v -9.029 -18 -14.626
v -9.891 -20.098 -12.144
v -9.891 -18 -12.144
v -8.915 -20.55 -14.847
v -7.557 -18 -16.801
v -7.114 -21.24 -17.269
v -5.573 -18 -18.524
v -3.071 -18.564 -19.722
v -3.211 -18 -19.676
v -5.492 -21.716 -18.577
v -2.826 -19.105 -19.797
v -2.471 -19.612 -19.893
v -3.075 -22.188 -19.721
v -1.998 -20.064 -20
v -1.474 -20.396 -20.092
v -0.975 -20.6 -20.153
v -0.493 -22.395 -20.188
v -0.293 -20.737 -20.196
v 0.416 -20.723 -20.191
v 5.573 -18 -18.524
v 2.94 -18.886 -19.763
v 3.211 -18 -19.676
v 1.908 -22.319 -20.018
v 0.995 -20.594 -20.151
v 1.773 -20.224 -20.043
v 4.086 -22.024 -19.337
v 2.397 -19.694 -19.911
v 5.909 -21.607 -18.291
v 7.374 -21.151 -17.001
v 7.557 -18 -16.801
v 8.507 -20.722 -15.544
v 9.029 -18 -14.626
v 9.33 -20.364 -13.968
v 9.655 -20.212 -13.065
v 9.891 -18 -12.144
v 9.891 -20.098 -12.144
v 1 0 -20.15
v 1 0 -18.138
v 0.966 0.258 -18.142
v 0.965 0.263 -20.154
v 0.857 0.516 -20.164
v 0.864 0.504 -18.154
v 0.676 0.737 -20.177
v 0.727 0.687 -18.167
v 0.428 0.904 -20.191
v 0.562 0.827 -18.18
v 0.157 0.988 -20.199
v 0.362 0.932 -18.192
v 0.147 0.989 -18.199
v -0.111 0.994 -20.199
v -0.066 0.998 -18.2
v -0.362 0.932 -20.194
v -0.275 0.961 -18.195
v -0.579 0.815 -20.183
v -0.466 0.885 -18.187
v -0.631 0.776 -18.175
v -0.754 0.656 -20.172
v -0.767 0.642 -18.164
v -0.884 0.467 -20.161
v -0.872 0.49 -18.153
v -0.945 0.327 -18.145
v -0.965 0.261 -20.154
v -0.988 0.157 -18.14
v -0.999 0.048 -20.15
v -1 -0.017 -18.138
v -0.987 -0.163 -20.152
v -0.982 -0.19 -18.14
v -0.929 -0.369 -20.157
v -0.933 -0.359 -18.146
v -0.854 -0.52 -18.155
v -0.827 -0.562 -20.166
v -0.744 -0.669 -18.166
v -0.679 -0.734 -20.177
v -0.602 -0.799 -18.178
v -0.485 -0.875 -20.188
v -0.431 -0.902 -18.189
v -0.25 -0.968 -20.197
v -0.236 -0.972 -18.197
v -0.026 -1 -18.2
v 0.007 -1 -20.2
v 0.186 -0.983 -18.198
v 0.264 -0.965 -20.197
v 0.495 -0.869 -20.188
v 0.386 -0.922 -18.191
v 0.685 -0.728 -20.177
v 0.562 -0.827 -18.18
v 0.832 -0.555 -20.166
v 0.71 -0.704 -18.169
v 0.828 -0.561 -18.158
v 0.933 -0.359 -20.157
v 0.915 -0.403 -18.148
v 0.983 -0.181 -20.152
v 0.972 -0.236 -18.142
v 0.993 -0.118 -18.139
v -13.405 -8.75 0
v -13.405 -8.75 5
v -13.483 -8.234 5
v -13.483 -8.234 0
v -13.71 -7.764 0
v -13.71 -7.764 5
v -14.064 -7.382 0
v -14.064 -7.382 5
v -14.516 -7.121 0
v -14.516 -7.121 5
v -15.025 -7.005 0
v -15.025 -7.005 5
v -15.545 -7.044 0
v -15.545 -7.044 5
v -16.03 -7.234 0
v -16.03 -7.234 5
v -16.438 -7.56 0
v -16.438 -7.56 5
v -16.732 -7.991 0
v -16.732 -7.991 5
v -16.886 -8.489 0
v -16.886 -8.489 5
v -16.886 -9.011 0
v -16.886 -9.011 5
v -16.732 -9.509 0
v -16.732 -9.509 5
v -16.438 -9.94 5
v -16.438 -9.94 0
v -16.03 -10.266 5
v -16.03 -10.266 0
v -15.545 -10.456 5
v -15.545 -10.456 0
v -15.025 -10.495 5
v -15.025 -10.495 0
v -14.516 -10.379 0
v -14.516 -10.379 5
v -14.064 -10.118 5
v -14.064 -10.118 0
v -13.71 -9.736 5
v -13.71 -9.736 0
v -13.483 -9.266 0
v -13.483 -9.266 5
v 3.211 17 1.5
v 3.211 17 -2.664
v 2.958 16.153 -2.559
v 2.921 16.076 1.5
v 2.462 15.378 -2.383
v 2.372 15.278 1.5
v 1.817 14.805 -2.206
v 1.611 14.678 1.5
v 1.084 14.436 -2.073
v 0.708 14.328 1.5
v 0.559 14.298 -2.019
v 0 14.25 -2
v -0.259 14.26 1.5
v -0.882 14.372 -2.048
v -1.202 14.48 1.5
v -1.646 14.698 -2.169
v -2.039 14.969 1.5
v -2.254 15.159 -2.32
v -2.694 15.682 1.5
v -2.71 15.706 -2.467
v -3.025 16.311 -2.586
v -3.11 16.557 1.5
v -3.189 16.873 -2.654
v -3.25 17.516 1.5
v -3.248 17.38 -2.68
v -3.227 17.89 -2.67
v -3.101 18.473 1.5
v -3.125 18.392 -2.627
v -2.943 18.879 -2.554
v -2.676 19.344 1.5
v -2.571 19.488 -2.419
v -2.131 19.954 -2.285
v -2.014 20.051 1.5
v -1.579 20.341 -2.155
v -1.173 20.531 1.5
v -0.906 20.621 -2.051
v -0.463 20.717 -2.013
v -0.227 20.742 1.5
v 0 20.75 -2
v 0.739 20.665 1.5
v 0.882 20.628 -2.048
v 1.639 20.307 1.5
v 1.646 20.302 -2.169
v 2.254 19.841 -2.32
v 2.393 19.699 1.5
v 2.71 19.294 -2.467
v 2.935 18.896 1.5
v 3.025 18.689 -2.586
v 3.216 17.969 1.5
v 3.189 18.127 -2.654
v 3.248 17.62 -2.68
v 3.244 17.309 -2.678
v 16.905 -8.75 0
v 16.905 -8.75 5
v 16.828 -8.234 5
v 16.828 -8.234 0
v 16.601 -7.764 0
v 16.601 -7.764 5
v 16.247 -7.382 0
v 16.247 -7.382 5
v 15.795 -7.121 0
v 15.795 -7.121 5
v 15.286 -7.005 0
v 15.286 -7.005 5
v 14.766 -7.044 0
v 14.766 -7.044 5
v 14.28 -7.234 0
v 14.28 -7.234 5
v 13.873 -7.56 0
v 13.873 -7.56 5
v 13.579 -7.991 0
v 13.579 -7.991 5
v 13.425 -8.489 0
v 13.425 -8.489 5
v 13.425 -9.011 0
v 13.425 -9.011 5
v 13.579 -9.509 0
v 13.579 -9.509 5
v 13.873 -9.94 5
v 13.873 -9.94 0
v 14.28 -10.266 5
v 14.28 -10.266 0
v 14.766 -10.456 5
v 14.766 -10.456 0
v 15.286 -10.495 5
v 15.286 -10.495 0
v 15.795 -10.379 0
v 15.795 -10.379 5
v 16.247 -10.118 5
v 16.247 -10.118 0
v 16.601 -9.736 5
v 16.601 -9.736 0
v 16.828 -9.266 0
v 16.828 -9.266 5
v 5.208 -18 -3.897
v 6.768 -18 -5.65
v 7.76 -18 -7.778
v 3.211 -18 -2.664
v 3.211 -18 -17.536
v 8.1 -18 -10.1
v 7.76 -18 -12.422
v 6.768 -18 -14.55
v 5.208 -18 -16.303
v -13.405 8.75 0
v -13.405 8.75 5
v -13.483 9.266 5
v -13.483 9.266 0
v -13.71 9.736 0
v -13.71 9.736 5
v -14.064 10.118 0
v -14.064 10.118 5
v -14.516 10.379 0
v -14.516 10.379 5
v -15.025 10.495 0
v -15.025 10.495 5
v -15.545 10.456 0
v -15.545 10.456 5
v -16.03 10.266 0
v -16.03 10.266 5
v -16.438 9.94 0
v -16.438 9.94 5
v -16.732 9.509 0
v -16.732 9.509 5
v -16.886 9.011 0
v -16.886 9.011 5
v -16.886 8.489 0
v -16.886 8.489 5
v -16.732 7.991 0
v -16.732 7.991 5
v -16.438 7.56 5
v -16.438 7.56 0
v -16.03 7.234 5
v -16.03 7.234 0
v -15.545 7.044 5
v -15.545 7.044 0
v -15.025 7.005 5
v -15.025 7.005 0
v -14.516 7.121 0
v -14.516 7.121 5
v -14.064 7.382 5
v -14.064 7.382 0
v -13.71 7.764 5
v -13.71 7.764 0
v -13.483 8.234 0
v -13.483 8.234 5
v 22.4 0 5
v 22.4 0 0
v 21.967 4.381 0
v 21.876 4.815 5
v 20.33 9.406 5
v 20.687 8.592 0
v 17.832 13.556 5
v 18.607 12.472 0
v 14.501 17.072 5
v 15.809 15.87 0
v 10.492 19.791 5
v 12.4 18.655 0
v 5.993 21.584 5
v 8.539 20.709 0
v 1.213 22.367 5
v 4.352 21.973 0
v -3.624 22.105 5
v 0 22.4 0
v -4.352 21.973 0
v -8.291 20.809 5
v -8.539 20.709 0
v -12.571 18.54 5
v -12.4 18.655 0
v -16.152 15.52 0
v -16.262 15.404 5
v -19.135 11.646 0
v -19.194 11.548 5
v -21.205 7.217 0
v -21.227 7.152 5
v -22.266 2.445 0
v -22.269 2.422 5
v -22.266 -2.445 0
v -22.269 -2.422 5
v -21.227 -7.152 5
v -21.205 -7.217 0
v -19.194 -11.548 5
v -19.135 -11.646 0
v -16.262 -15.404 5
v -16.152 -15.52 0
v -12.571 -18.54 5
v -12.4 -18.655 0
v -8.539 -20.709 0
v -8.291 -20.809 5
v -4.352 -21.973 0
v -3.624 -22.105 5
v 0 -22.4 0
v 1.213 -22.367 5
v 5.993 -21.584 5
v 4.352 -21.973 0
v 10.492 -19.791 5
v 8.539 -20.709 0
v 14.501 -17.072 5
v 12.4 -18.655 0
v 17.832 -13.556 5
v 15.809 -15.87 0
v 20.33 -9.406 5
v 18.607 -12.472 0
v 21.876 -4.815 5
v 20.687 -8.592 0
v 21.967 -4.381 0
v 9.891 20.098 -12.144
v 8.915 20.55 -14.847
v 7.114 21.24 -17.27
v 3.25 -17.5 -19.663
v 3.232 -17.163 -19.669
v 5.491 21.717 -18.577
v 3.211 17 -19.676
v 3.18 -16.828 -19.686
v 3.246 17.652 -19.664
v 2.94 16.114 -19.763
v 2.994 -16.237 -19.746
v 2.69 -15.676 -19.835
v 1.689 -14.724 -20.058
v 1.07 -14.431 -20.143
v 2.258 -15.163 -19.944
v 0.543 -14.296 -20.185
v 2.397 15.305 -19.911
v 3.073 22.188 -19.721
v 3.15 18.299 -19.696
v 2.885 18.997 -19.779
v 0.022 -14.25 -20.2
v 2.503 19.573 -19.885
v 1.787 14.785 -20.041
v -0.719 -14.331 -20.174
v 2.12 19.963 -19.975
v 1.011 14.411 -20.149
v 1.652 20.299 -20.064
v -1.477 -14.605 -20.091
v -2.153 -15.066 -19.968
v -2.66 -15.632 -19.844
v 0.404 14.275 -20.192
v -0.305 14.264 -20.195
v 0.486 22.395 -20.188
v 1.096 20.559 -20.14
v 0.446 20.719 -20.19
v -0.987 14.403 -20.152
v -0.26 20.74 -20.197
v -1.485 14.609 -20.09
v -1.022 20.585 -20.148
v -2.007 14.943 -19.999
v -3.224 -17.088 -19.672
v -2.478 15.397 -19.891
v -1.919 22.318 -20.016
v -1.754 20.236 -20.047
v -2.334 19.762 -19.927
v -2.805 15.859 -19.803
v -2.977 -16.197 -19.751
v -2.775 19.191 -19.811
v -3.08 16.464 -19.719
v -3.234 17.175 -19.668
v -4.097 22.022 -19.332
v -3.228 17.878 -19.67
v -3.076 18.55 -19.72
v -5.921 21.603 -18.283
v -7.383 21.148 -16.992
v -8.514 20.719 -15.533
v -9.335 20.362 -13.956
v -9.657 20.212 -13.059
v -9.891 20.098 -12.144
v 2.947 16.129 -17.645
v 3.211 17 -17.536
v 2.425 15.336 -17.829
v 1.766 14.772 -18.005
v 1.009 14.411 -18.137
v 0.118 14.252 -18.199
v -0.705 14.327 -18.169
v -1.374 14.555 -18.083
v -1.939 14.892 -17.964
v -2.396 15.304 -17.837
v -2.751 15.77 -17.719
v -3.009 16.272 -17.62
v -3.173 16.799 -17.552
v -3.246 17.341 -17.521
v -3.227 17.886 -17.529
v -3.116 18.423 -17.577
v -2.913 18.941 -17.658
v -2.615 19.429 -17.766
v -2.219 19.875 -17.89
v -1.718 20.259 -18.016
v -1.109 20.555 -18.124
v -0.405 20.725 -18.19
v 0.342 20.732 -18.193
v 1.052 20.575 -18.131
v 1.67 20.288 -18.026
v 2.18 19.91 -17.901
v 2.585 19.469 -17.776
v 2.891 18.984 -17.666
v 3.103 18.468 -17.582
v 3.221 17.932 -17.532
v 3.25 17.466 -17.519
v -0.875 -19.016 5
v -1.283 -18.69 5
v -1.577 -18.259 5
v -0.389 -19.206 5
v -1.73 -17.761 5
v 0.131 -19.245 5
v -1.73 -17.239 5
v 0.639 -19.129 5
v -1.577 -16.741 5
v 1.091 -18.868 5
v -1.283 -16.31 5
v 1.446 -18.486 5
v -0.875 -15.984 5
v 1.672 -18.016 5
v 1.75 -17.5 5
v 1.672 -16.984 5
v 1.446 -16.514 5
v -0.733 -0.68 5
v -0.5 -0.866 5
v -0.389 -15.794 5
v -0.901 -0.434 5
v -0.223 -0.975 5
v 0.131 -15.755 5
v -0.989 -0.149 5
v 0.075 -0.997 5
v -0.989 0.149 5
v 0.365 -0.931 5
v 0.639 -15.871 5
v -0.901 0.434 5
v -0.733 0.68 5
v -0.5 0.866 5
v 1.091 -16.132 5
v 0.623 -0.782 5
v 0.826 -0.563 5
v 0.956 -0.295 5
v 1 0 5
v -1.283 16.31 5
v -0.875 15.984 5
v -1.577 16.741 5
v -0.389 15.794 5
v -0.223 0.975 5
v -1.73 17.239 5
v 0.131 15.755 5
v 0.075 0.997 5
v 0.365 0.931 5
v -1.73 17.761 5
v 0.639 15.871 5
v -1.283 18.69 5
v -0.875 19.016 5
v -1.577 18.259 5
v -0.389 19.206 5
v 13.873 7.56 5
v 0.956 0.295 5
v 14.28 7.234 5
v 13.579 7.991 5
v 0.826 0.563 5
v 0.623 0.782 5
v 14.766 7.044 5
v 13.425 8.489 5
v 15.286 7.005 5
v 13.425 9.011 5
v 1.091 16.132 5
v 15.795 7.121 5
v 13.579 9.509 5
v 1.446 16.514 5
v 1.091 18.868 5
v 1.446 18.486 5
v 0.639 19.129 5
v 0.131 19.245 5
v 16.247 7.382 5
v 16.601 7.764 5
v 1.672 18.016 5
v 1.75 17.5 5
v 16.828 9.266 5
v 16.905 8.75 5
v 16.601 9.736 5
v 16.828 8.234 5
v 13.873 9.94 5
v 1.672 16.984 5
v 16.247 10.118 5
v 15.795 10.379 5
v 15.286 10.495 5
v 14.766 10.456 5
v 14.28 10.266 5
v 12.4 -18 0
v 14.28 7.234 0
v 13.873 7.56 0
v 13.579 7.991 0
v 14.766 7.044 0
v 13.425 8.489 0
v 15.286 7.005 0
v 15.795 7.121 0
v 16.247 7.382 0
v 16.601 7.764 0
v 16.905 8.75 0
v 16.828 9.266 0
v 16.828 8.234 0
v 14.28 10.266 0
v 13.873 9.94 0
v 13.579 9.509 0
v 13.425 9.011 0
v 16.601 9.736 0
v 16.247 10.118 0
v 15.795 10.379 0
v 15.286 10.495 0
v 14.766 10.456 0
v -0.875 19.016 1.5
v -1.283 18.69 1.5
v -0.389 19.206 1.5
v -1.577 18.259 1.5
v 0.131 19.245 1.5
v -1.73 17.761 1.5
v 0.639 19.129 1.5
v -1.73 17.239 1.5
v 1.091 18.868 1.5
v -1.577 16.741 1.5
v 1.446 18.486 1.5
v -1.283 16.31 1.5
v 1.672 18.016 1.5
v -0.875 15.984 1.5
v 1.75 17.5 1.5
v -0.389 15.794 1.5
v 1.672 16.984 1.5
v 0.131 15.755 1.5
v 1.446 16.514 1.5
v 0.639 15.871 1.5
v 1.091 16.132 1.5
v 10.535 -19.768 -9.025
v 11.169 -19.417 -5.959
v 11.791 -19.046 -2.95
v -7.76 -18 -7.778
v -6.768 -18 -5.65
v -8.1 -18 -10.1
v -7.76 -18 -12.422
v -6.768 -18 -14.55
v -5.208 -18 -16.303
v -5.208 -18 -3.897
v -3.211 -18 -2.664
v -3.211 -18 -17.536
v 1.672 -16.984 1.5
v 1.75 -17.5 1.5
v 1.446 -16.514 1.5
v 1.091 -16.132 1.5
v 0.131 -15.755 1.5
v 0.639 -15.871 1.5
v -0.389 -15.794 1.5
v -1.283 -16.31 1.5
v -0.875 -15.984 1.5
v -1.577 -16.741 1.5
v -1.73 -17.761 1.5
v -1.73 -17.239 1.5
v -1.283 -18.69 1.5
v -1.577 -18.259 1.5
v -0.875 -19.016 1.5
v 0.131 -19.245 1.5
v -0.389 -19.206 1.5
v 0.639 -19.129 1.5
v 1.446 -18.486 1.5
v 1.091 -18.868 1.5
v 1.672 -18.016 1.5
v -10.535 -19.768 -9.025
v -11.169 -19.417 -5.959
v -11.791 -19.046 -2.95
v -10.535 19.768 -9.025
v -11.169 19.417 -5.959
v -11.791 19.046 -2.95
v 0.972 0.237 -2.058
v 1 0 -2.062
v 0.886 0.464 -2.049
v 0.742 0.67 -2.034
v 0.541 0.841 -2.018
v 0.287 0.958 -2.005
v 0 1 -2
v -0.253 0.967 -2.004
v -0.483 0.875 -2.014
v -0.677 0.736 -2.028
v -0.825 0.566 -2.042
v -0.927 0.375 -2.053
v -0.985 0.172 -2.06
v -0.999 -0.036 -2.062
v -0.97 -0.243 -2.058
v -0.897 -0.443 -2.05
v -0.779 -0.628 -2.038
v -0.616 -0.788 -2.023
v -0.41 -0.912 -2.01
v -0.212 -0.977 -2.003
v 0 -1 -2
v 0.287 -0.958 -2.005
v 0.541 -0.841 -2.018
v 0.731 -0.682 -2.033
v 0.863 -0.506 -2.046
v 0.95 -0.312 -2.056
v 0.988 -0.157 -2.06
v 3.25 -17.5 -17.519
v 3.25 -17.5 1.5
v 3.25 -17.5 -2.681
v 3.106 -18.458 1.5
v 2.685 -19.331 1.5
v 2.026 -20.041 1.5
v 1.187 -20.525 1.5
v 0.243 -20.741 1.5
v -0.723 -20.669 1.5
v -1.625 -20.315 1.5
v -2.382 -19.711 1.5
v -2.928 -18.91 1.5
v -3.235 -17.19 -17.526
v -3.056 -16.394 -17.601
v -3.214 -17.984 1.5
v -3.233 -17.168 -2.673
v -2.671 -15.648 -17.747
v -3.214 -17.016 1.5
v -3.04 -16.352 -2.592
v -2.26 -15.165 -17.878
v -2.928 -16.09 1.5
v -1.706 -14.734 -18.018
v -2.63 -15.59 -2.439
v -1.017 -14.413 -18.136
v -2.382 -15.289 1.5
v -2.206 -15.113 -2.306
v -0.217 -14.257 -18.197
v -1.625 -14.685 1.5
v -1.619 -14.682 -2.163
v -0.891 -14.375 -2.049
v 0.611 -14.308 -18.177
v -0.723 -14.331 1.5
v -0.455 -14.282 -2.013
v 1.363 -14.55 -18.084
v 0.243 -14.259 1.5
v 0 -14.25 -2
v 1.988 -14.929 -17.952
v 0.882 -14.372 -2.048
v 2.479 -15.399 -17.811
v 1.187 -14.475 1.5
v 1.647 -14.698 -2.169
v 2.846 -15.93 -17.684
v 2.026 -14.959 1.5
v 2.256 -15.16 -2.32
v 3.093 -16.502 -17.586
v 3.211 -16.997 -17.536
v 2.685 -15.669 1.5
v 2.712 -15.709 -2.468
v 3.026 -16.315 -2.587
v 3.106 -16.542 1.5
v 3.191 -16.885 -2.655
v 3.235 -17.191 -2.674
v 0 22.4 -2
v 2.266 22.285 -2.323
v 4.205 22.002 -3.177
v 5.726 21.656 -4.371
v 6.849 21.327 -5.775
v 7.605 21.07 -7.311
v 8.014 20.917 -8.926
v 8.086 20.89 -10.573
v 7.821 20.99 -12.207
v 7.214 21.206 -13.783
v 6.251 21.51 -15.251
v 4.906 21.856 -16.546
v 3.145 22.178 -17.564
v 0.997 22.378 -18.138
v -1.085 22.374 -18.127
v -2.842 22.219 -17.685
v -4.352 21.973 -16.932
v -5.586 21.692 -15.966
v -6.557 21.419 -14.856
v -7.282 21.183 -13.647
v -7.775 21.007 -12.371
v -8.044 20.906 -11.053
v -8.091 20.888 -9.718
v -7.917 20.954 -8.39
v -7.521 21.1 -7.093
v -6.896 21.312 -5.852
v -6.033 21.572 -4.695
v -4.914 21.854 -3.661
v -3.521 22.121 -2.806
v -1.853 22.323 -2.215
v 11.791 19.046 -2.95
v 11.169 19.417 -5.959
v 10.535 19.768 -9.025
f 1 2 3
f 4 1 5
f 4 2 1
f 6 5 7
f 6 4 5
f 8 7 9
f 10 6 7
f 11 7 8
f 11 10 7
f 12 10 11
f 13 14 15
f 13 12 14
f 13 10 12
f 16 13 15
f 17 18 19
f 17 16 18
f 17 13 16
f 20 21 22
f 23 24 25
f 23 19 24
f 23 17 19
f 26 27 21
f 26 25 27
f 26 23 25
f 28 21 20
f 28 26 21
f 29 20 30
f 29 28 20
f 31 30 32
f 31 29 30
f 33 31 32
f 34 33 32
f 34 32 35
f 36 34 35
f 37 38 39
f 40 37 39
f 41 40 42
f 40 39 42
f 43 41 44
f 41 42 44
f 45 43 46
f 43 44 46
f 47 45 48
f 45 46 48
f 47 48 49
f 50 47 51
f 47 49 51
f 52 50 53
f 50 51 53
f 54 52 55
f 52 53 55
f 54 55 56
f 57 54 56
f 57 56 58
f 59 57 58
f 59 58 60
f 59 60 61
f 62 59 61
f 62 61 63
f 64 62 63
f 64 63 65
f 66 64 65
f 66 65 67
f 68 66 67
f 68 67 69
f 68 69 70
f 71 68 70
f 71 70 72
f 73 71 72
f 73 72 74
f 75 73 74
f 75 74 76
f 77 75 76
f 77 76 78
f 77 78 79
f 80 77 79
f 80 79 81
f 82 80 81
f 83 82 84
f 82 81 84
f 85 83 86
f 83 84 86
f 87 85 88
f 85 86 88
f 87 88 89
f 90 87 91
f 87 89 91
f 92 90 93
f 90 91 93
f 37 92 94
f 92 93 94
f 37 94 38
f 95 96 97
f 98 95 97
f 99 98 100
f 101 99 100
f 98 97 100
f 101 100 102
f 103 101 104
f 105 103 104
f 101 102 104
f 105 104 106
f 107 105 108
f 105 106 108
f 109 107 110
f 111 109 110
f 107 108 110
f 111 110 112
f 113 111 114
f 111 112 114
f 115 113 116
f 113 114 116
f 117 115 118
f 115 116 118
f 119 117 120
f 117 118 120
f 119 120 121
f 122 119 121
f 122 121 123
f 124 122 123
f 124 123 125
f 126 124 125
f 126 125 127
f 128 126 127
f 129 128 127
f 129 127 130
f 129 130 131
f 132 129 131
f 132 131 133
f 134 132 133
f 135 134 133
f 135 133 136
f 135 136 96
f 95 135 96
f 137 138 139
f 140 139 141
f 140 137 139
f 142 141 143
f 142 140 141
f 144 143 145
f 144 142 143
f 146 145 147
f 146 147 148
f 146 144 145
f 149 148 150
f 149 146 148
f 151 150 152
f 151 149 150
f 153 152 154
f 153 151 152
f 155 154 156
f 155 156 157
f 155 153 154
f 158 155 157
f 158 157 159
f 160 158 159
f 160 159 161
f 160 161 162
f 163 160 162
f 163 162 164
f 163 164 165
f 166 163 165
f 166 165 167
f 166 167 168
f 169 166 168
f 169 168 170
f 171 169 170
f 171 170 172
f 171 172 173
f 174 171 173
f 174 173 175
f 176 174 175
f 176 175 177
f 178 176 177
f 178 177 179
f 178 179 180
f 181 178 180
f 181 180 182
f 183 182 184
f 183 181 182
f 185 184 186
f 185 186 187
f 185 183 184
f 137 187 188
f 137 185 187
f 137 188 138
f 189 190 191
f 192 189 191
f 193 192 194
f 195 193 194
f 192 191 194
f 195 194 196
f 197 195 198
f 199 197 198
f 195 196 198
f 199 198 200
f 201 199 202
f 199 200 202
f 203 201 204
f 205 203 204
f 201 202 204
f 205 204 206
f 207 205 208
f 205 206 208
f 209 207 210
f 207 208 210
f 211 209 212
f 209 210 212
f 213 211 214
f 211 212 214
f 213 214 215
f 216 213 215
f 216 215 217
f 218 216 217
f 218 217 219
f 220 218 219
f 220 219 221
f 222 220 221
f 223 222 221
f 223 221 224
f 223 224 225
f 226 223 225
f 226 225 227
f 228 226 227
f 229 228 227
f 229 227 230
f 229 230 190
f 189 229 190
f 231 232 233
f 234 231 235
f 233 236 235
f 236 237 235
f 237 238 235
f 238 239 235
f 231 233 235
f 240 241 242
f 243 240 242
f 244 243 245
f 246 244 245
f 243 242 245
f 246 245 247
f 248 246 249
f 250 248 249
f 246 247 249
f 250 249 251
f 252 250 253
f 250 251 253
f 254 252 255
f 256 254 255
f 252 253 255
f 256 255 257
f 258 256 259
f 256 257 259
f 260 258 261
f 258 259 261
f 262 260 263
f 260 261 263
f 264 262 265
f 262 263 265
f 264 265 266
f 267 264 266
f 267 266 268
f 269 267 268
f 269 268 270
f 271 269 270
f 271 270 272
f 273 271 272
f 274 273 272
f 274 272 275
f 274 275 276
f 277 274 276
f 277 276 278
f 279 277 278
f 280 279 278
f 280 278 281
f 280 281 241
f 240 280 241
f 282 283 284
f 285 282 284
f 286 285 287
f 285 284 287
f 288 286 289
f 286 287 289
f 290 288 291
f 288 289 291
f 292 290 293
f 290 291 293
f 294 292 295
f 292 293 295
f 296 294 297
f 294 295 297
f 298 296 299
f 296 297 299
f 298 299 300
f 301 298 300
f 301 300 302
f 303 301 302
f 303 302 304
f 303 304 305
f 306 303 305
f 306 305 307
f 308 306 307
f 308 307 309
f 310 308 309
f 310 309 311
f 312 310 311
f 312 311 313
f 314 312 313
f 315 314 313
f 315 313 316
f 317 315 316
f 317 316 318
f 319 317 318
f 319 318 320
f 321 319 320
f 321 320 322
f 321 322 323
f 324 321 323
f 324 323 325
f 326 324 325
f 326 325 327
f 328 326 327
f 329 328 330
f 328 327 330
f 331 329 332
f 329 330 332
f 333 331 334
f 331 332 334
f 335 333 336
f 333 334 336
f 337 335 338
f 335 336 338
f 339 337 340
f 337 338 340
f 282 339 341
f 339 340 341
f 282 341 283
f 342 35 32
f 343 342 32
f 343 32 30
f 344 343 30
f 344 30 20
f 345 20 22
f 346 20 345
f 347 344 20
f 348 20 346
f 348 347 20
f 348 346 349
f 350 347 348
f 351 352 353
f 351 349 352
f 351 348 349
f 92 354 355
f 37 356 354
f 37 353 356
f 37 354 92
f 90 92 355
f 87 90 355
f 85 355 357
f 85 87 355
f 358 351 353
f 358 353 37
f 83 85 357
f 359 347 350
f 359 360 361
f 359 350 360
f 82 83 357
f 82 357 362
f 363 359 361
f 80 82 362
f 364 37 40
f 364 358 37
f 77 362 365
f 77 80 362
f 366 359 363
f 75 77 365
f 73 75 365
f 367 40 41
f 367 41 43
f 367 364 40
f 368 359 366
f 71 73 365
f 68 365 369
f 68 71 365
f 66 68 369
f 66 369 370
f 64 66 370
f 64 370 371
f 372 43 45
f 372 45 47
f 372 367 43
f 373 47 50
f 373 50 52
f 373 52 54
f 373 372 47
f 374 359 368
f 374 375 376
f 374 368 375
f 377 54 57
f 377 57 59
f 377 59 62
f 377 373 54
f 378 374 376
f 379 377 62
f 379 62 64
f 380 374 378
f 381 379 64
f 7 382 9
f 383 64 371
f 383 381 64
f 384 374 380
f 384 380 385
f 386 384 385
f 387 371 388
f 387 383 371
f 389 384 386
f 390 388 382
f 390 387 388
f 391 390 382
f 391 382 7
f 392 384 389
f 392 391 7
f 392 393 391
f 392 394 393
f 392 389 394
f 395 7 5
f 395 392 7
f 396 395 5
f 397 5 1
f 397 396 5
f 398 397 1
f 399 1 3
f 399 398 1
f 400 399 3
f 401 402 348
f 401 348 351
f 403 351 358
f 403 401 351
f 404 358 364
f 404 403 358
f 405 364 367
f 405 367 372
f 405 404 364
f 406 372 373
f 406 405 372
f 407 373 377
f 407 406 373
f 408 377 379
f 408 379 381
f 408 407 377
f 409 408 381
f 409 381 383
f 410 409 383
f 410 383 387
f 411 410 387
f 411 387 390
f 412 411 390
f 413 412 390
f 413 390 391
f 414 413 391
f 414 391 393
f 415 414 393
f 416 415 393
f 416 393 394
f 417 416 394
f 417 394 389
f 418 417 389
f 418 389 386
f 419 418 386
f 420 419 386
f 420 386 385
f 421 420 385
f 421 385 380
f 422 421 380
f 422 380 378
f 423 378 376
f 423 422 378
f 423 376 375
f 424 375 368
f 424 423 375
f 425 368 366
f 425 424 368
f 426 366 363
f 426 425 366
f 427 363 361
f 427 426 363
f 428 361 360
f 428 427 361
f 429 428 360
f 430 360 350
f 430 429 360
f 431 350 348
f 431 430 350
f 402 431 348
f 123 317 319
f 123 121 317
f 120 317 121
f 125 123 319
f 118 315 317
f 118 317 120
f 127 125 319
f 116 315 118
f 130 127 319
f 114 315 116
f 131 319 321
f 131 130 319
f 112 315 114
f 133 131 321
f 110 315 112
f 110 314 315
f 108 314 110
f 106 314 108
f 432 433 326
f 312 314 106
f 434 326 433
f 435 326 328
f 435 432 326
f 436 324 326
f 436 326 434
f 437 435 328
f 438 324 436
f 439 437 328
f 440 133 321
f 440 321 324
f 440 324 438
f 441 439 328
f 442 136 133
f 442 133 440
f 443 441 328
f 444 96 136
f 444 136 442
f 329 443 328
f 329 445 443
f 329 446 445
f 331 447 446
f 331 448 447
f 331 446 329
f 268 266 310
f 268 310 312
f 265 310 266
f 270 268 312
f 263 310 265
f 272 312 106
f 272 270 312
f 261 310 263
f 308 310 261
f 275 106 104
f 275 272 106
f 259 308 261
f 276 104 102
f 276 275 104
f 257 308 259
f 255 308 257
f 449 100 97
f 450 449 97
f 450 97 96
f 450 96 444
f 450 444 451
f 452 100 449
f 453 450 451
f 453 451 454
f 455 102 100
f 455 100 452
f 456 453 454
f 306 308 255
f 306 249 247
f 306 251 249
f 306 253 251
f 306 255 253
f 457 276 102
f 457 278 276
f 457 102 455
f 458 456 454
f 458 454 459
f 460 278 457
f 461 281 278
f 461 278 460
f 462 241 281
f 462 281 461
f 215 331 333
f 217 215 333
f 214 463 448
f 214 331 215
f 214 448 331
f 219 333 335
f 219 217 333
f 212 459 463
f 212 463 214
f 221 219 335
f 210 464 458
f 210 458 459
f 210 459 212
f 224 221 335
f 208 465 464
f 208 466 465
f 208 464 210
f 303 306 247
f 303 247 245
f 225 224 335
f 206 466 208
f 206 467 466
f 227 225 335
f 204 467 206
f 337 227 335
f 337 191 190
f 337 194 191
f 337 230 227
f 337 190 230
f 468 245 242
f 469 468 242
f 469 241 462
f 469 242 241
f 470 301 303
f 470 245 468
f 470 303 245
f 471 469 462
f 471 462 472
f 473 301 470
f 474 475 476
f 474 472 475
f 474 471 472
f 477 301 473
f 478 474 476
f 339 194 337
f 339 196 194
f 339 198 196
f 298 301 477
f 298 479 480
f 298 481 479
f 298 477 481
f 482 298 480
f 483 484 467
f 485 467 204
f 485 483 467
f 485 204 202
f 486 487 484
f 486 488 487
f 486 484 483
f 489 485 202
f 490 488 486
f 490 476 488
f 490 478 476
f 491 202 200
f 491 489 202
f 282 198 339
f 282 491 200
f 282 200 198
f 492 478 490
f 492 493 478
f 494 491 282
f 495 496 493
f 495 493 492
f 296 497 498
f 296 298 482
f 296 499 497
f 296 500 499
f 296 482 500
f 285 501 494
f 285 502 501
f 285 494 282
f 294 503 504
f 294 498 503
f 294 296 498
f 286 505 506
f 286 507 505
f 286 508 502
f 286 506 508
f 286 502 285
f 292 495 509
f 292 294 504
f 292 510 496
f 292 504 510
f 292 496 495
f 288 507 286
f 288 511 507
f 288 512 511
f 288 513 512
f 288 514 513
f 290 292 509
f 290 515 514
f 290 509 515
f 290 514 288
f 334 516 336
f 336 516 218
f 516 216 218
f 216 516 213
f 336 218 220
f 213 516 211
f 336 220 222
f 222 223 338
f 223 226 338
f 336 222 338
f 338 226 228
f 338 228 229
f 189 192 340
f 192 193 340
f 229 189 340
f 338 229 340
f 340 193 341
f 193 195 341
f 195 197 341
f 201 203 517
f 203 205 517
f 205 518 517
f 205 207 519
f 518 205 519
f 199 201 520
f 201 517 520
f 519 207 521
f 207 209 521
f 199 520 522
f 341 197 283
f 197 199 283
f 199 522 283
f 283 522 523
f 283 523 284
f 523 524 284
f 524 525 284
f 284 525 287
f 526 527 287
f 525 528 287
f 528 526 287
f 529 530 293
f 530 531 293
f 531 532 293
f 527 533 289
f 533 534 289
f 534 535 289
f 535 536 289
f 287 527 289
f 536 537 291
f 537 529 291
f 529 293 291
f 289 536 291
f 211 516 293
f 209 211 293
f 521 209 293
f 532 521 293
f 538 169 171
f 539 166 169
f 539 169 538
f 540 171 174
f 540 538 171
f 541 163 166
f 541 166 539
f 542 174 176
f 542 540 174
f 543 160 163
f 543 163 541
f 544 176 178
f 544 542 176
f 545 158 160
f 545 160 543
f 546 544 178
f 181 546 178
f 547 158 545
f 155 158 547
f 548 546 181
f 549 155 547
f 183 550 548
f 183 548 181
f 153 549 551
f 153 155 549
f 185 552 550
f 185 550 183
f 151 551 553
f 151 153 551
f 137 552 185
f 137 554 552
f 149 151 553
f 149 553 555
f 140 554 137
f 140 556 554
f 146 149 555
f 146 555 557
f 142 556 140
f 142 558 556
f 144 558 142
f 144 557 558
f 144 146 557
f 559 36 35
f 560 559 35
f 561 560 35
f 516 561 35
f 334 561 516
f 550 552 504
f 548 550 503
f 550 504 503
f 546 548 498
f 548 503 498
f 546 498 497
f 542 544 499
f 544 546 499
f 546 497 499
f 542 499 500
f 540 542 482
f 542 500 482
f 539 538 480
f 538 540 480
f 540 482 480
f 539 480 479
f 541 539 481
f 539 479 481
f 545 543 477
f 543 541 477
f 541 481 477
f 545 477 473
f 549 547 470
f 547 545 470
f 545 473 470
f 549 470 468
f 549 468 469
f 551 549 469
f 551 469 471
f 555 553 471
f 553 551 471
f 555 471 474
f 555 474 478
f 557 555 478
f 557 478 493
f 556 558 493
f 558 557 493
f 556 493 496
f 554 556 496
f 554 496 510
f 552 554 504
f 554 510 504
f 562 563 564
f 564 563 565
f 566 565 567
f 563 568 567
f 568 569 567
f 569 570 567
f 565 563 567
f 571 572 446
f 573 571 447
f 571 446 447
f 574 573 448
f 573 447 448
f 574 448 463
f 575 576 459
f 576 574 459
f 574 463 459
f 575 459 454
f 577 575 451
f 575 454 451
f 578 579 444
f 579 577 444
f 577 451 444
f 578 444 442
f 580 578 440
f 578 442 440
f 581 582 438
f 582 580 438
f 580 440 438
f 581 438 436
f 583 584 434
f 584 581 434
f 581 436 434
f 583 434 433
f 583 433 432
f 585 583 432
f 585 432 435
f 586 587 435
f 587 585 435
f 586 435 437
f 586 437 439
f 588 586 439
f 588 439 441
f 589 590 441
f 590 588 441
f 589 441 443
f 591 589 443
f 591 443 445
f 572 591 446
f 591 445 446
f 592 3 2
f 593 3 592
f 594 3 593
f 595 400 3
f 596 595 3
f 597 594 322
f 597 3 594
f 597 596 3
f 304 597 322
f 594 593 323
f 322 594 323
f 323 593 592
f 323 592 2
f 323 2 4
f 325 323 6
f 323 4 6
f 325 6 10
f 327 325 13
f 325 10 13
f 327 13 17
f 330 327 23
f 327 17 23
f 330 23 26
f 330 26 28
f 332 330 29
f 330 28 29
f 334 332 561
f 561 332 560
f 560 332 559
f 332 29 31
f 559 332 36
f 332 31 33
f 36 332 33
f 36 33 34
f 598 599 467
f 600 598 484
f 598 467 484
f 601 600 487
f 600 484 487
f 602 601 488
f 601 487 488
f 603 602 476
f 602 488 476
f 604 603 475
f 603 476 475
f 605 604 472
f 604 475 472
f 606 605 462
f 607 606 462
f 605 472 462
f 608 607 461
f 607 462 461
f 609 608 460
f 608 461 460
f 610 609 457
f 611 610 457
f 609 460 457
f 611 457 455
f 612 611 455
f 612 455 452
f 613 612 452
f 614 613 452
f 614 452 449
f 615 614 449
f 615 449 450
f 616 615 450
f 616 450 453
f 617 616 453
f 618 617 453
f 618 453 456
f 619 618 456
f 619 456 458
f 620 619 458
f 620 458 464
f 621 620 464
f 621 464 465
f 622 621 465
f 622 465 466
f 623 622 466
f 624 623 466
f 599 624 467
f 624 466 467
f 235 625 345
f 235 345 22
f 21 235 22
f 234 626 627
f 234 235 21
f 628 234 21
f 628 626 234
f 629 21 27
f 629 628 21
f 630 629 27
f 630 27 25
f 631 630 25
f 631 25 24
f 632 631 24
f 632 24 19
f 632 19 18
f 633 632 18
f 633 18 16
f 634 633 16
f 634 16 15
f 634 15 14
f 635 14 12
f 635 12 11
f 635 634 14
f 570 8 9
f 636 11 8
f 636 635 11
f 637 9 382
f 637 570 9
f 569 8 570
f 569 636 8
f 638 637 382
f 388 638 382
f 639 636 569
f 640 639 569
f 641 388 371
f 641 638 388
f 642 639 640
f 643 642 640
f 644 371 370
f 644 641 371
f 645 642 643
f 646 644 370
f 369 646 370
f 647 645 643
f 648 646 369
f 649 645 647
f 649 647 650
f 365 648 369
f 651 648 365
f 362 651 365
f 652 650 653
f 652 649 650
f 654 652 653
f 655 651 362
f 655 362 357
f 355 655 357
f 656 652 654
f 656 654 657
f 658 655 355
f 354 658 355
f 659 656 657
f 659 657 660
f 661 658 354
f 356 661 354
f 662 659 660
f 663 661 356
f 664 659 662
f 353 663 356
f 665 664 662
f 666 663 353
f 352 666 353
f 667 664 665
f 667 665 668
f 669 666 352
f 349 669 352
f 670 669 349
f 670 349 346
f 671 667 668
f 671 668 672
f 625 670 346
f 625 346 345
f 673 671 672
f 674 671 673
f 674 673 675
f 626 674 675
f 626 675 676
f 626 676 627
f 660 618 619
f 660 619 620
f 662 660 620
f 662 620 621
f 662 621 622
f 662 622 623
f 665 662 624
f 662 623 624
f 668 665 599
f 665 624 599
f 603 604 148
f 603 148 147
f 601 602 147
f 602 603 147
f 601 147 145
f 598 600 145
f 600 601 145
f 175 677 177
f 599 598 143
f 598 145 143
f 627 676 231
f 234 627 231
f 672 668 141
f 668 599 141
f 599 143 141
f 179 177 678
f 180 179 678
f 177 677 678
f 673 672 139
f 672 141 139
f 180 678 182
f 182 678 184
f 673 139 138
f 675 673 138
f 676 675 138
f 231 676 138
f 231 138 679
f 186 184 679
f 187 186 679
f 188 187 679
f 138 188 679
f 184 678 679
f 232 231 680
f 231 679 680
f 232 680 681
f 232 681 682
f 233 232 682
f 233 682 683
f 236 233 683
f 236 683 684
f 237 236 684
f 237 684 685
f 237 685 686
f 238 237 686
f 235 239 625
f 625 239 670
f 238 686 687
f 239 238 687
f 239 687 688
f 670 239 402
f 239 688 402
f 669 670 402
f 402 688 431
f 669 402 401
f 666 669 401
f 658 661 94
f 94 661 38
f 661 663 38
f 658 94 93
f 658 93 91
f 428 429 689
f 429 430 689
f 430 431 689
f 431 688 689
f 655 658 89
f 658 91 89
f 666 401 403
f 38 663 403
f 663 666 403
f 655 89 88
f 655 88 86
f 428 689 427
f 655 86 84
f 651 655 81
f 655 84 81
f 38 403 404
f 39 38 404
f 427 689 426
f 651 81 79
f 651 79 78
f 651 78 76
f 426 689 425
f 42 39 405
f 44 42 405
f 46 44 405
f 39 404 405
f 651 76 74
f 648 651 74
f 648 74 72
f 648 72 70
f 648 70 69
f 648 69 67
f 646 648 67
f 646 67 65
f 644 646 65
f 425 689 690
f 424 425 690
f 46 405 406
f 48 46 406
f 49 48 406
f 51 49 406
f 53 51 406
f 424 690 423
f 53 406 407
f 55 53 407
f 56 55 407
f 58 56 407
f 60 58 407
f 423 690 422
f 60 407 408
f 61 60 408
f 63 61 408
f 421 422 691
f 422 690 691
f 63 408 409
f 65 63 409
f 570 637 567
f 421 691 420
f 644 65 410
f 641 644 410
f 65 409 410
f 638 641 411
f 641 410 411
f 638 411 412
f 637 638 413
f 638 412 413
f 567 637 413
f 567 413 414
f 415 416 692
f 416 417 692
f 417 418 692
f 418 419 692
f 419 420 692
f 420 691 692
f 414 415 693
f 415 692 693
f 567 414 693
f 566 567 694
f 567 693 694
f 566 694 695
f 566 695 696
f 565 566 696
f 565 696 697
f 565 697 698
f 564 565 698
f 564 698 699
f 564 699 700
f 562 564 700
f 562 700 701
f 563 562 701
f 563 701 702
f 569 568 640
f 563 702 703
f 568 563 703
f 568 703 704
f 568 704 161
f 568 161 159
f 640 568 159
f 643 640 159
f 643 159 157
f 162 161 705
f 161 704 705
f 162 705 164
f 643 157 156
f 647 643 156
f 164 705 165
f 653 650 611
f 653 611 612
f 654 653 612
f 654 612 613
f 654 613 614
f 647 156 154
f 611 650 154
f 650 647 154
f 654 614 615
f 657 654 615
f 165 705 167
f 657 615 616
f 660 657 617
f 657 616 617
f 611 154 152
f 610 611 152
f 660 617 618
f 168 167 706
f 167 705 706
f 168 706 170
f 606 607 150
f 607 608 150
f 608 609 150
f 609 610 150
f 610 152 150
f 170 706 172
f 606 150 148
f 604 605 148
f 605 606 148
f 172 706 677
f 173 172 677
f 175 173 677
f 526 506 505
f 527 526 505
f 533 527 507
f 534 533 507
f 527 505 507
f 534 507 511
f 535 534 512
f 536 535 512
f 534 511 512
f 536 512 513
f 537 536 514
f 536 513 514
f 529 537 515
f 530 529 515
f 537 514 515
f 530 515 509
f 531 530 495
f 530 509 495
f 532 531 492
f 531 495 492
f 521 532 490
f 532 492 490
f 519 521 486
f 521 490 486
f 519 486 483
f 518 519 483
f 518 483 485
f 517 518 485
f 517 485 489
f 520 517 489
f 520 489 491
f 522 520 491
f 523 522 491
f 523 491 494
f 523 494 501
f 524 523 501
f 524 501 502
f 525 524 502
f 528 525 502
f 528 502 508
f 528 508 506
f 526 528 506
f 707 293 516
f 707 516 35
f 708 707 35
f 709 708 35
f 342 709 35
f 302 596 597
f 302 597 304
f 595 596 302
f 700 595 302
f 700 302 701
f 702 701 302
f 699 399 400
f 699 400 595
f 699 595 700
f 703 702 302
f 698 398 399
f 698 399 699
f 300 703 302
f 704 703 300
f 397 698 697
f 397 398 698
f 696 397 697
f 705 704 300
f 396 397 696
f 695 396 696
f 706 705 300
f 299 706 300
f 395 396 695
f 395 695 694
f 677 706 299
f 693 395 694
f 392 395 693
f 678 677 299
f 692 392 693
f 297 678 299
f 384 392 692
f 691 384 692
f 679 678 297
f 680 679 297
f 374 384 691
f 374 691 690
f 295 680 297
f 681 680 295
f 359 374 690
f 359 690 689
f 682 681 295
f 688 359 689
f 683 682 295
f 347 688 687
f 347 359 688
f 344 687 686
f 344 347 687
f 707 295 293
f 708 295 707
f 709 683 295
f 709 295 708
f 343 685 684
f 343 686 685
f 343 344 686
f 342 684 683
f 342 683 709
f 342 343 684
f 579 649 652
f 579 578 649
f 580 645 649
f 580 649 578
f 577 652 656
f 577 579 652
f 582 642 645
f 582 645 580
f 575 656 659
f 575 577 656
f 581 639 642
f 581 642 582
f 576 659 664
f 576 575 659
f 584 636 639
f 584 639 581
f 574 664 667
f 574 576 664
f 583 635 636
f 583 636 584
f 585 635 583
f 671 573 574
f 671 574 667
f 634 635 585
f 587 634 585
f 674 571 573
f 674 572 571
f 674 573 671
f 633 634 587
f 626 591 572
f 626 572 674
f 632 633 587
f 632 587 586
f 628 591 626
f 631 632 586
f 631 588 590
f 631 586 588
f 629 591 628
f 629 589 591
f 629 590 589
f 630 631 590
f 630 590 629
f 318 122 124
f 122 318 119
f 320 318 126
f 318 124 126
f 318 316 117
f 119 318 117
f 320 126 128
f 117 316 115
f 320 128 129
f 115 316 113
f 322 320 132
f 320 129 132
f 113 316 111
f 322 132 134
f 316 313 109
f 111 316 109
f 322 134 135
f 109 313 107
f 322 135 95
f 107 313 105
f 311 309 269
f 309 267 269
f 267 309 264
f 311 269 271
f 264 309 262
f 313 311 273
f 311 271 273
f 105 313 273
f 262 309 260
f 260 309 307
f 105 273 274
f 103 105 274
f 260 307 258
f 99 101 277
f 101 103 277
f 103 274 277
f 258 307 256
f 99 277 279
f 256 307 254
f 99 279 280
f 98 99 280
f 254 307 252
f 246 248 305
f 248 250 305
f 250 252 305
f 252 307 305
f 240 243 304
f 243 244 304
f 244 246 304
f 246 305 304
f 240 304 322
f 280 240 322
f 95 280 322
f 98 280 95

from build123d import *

# Parameters (mm, degrees)
SKETCH1_R                       = 22.4
BOSS_EXTRUDE1_DEPTH             = 5
BOSS_EXTRUDE2_REACH             = 34.071
BOSS_EXTRUDE2_END_RADIUS        = 22.4
SKETCH3_R                       = 8.1
BOSS_EXTRUDE2_DIRECTION_2_DEPTH = 18
BOSS_EXTRUDE5_START             = 21
BOSS_EXTRUDE5_DEPTH             = 21
CUT_EXTRUDE2_START              = -21
CUT_EXTRUDE2_DEPTH              = 21
SKETCH2_R                       = 1.75
CUT_EXTRUDE1_DEPTH              = 41.479130543
CUT_EXTRUDE3_DEPTH              = 21
CUT_EXTRUDE3_DEPTH_BACK         = 1.5
SKETCH7_R                       = 3.25
SKETCH7_R_2                     = 1.75
SKETCH8_R                       = 1
CUT_EXTRUDE4_DEPTH              = 41.479130543


with BuildPart() as part:
    # Sketch1 → Boss-Extrude1 (new body)
    with BuildSketch(Plane.XY):
        Circle(SKETCH1_R)
    extrude(amount=BOSS_EXTRUDE1_DEPTH)



with BuildPart() as body_2:
    # Boss-Extrude2: up to this cylinder (the profile starts inside it)
    boss_extrude2_end = Plane(origin=(0, 0, -6.007051), z_dir=(0, 0, -1)) * Cylinder(BOSS_EXTRUDE2_END_RADIUS, 113.942, mode=Mode.PRIVATE)
    # Sketch3 → Boss-Extrude2 (new, up to the surface)
    with BuildSketch(Plane(origin=(0, 0, 0), x_dir=(1, 0, 0), z_dir=(0, 1, 0)), mode=Mode.PRIVATE) as boss_extrude2_sk1:
        with BuildLine():
            Line((-9.89110529, 12.143535207), (-12.4, 0))
            Line((-12.4, 0), (12.4, 0))
            Line((12.4, 0), (9.89110529, 12.143535207))
            ThreePointArc((9.89110529, 12.143535207), (0, 20.2), (-9.89110529, 12.143535207))
        make_face()
        with Locations(Location((0, 10.1, 0), (0, 0, 270))):
            Circle(SKETCH3_R, mode=Mode.SUBTRACT)
    boss_extrude2_tool1 = extrude(boss_extrude2_sk1.sketch, amount=BOSS_EXTRUDE2_REACH, mode=Mode.PRIVATE) & boss_extrude2_end
    add(boss_extrude2_tool1.solids().sort_by_distance((-10.832312, 0, -6.007051))[0])

    # Sketch3 → Boss-Extrude2 direction 2 (add)
    with BuildSketch(Plane(origin=(0, 0, 0), x_dir=(1, 0, 0), z_dir=(0, 1, 0))):
        with BuildLine():
            Line((-9.89110529, 12.143535207), (-12.4, 0))
            Line((-12.4, 0), (12.4, 0))
            Line((12.4, 0), (9.89110529, 12.143535207))
            ThreePointArc((9.89110529, 12.143535207), (0, 20.2), (-9.89110529, 12.143535207))
        make_face()
        with Locations(Location((0, 10.1, 0), (0, 0, 270))):
            Circle(SKETCH3_R, mode=Mode.SUBTRACT)
    extrude(amount=-BOSS_EXTRUDE2_DIRECTION_2_DEPTH)


with BuildPart() as part_1:
    add(part.part)

    add(body_2.part)  # Boss-Extrude5 merges body 2
    # Sketch4 → Boss-Extrude5 (add)
    with BuildSketch(Plane(origin=(0, 0, 0), x_dir=(-1, 0, 0), z_dir=(0, 0, -1)).offset(BOSS_EXTRUDE5_START)):
        with BuildLine():
            Line((9.89110529, -18), (12.4, -18))
            Line((12.4, -18), (12.4, -18.654758106))
            ThreePointArc((12.4, -18.654758106), (0, -22.4), (-12.4, -18.654758106))
            Line((-12.4, -18.654758106), (-12.4, -18))
            Line((-12.4, -18), (-9.89110529, -18))
            Line((-9.89110529, -18), (9.89110529, -18))
        make_face()
    extrude(amount=-BOSS_EXTRUDE5_DEPTH)

    # Sketch6 → Cut-Extrude2 (cut)
    with BuildSketch(Plane(origin=(0, -18, 0), x_dir=(1, 0, 0), z_dir=(0, 1, 0)).offset(CUT_EXTRUDE2_START)):
        with BuildLine():
            Line((9.89110529, 12.143535207), (12.4, 0))
            Line((12.4, 0), (12.4, 21))
            Line((12.4, 21), (-12.4, 21))
            Line((-12.4, 21), (-12.4, 0))
            Line((-12.4, 0), (-9.89110529, 12.143535207))
            ThreePointArc((-9.89110529, 12.143535207), (0, 20.2), (9.89110529, 12.143535207))
        make_face()
    extrude(amount=CUT_EXTRUDE2_DEPTH, mode=Mode.SUBTRACT)

    # Sketch2 → Cut-Extrude1 (cut, through all)
    with BuildSketch(Plane.XY.offset(5)):
        with Locations((0, 17.5)):
            Circle(SKETCH2_R)
        with Locations((15.155444566, 8.75)):
            Circle(SKETCH2_R)
        with Locations((15.155444566, -8.75)):
            Circle(SKETCH2_R)
        with Locations((0, -17.5)):
            Circle(SKETCH2_R)
        with Locations((-15.155444566, -8.75)):
            Circle(SKETCH2_R)
        with Locations((-15.155444566, 8.75)):
            Circle(SKETCH2_R)
    extrude(amount=-CUT_EXTRUDE1_DEPTH, mode=Mode.SUBTRACT)

    # Sketch7 → Cut-Extrude3 (cut, two sides: drawn at the far end of the back side and taken through both)
    # profile 1 of 2: a face of its own
    with BuildSketch(Plane(origin=(0, 0, 0), x_dir=(-1, 0, 0), z_dir=(0, 0, -1)).offset(-CUT_EXTRUDE3_DEPTH_BACK)):
        with Locations(Location((0, 17.5, 0), (0, 0, 188.849872023))):
            Circle(SKETCH7_R)
        with Locations(Location((0, 17.5, 0), (0, 0, 180))):
            Circle(SKETCH7_R_2, mode=Mode.SUBTRACT)
    # profile 2 of 2: a face of its own
    with BuildSketch(Plane(origin=(0, 0, 0), x_dir=(-1, 0, 0), z_dir=(0, 0, -1)).offset(-CUT_EXTRUDE3_DEPTH_BACK)):
        with Locations(Location((0, -17.5, 0), (0, 0, 180))):
            Circle(SKETCH7_R)
        with Locations(Location((0, -17.5, 0), (0, 0, 180))):
            Circle(SKETCH7_R_2, mode=Mode.SUBTRACT)
    extrude(amount=CUT_EXTRUDE3_DEPTH + CUT_EXTRUDE3_DEPTH_BACK, mode=Mode.SUBTRACT)

    # Sketch8 → Cut-Extrude4 (cut, through all)
    with BuildSketch(Plane.XY.offset(5)):
        Circle(SKETCH8_R)
    extrude(amount=-CUT_EXTRUDE4_DEPTH, mode=Mode.SUBTRACT)


solid = part_1.part
